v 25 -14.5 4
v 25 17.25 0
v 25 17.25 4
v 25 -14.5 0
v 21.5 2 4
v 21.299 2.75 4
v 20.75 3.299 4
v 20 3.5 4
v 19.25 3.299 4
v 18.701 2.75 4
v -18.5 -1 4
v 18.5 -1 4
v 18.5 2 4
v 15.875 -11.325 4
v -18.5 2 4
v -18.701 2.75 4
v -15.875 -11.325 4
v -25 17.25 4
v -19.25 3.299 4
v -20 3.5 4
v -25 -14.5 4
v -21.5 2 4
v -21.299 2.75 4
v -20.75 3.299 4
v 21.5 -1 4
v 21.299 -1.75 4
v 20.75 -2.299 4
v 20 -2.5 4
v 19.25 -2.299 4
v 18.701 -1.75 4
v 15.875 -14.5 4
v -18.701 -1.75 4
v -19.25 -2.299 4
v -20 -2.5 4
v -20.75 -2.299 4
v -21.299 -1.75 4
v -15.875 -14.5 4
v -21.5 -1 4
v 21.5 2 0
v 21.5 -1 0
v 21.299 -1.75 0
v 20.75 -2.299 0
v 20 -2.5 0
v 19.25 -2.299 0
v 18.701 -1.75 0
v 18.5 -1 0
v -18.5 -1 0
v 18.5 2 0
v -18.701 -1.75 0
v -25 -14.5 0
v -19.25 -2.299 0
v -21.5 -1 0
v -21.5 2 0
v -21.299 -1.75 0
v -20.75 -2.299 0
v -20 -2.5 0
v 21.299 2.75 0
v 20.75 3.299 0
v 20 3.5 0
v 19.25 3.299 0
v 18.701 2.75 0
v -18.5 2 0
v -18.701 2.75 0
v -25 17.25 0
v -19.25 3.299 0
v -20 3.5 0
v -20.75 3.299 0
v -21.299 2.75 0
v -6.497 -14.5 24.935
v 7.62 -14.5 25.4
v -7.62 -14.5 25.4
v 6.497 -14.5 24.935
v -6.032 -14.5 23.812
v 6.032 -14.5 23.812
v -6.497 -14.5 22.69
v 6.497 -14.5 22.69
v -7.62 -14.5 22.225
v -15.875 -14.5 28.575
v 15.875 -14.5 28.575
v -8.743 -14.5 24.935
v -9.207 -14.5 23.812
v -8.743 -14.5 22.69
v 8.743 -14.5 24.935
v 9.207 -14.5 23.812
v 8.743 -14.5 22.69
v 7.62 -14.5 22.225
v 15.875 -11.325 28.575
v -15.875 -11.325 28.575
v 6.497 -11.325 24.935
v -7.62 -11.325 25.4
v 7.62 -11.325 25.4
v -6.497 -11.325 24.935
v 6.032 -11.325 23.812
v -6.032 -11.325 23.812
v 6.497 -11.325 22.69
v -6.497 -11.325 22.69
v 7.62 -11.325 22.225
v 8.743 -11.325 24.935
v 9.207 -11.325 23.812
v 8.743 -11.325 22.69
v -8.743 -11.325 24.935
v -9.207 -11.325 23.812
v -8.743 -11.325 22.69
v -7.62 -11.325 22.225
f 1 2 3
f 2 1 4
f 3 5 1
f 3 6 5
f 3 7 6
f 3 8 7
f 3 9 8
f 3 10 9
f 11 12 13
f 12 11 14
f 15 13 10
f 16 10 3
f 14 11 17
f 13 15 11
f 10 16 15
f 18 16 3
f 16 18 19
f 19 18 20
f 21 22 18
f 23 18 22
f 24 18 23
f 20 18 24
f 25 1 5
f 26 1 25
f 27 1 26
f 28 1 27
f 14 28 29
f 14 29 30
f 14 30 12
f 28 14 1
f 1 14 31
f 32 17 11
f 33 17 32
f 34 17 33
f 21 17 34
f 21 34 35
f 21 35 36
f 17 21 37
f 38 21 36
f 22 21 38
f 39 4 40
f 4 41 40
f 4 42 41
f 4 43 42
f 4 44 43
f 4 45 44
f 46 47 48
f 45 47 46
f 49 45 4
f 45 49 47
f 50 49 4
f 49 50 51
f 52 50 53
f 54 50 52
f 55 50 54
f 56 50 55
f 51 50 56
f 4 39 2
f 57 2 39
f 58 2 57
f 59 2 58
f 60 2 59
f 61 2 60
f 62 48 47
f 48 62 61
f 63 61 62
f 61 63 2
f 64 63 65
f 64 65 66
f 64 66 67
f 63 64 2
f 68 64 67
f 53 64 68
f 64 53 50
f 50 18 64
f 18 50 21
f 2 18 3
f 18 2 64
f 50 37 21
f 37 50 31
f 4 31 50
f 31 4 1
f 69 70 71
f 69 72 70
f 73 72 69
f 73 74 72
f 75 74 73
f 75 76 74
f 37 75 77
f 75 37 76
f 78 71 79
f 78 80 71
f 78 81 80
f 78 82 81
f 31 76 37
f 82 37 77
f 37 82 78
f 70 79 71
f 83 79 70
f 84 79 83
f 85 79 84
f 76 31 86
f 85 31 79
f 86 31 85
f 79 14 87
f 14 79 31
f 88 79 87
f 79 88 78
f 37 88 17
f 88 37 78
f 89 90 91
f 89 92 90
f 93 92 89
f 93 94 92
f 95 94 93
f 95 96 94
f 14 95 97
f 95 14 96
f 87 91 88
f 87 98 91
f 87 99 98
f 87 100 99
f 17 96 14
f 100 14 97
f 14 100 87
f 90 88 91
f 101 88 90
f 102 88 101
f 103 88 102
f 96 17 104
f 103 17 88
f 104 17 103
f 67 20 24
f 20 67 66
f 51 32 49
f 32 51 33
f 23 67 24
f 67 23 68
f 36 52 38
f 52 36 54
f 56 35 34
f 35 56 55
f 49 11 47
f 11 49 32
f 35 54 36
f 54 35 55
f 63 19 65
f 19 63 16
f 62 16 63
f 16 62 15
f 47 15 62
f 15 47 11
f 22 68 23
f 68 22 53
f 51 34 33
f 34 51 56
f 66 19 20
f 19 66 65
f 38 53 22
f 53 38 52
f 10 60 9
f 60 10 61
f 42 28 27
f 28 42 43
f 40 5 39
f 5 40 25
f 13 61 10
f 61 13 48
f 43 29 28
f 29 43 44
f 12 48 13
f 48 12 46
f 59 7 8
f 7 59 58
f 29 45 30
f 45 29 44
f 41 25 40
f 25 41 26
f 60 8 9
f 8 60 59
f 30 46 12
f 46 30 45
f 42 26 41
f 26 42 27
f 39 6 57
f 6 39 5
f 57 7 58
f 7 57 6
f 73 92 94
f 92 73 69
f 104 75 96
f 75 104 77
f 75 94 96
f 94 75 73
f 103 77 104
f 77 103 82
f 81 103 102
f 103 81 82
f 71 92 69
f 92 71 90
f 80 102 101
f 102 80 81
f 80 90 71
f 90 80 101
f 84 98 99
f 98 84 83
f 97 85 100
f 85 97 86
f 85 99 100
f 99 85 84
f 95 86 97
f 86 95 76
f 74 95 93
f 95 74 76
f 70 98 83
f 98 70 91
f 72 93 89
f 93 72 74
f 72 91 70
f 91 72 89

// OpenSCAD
// file: utils.scad
//
// general utility functions for OpenSCAD
//
function inch(in) = 25.4*in;
// main file
// ring mount for components
// Copyright (C) 2016, Theodore C Yapo

use <utils.scad>;


ring_length = 10;
center_height = 14.5;
outer_d = 2*center_height / cos(30);
ring_thickness = 4;
inner_d = outer_d - 2*ring_thickness;
screw_spacing = inch(0.6);
base_width = inch(1.25);
base_thickness = inch(0.125);
base_length = inch(1.125);

face_width = 50;
nut_block_thickness = 6;
nut_block_width = 12;

// recesses for #4-40 hex nuts
nut_d = inch(0.25) / cos(30) + 0.5;
nut_h = 3;

set_screw_d = inch(0.125);
mounting_hole_spacing = 40;
mounting_hole_height = 15;
mounting_hole_d = 3;
mounting_slot_length = 3;

epsilon = 1;

face_thickness = 4;

module LED_mount(){
  difference(){
    union(){
      // face
      translate([-face_width/2, -center_height, 0]){
        cube([face_width, base_width, face_thickness]);
      }

      // base
      translate([-base_width/2, -center_height, 0]){
        cube([base_width, base_thickness, base_length]);
      }
    }

    // board mounting slots
    hull(){
      translate([-mounting_hole_spacing/2,
                 -center_height+mounting_hole_height-mounting_slot_length/2,
                 -epsilon]){
        cylinder($fn=12, d = mounting_hole_d, h = face_thickness + 2*epsilon);
      }
      translate([-mounting_hole_spacing/2,
                 -center_height+mounting_hole_height+mounting_slot_length/2,
                 -epsilon]){
        cylinder($fn=12, d = mounting_hole_d, h = face_thickness + 2*epsilon);
      }
    }

    hull(){
      translate([+mounting_hole_spacing/2,
                 -center_height+mounting_hole_height-mounting_slot_length/2,
                 -epsilon]){
        cylinder($fn=12, d = mounting_hole_d, h = face_thickness + 2*epsilon);
      }
      translate([+mounting_hole_spacing/2,
                 -center_height+mounting_hole_height+mounting_slot_length/2,
                 -epsilon]){
        cylinder($fn=12, d = mounting_hole_d, h = face_thickness + 2*epsilon);
      }
    }


    // mounting screw holes
    translate([-inch(0.6)/2,
               -center_height-epsilon,
               (base_length - inch(0.75))/2]){
      rotate([-90, 0, 0]){
        *cylinder($fn=8, d = inch(0.125), h = inch(0.25));
      }
    }
    translate([+inch(0.6)/2,
               -center_height-epsilon,
               (base_length - inch(0.75))/2]){
      rotate([-90, 0, 0]){
        *cylinder($fn=8, d = inch(0.125), h = inch(0.25));
      }
    }
    translate([-inch(0.6)/2,
               -center_height - epsilon,
               base_length - (base_length - inch(0.75))/2]){
      rotate([-90, 0, 0]){
        cylinder($fn=8, d = inch(0.125), h = inch(0.25));
      }
    }
    translate([+inch(0.6)/2,
               -center_height - epsilon,
               base_length - (base_length - inch(0.75))/2]){
      rotate([-90, 0, 0]){
        cylinder($fn=8, d = inch(0.125), h = inch(0.25));
      }
    }
  }  
}

module HS()
{
  translate([-19/2, -14/2, 1.6]){
    cube([19, 14, 5]);
  }
}
module Saber_Z1()
{
  translate([-9.9/2, -9.9/2, 0]){
    cube([34.8, 9.9, 1.6]);
  }
}

module printing_layout()
{
  // rotate([0, 90, 0]){
    LED_mount();
    // }
}

module LED_mount_assembly()
{
  LED_mount();

  translate([0, 0, face_thickness]){
    Saber_Z1();
    color("red") HS();
  }
}


printing_layout();

//LED_mount_assembly();
